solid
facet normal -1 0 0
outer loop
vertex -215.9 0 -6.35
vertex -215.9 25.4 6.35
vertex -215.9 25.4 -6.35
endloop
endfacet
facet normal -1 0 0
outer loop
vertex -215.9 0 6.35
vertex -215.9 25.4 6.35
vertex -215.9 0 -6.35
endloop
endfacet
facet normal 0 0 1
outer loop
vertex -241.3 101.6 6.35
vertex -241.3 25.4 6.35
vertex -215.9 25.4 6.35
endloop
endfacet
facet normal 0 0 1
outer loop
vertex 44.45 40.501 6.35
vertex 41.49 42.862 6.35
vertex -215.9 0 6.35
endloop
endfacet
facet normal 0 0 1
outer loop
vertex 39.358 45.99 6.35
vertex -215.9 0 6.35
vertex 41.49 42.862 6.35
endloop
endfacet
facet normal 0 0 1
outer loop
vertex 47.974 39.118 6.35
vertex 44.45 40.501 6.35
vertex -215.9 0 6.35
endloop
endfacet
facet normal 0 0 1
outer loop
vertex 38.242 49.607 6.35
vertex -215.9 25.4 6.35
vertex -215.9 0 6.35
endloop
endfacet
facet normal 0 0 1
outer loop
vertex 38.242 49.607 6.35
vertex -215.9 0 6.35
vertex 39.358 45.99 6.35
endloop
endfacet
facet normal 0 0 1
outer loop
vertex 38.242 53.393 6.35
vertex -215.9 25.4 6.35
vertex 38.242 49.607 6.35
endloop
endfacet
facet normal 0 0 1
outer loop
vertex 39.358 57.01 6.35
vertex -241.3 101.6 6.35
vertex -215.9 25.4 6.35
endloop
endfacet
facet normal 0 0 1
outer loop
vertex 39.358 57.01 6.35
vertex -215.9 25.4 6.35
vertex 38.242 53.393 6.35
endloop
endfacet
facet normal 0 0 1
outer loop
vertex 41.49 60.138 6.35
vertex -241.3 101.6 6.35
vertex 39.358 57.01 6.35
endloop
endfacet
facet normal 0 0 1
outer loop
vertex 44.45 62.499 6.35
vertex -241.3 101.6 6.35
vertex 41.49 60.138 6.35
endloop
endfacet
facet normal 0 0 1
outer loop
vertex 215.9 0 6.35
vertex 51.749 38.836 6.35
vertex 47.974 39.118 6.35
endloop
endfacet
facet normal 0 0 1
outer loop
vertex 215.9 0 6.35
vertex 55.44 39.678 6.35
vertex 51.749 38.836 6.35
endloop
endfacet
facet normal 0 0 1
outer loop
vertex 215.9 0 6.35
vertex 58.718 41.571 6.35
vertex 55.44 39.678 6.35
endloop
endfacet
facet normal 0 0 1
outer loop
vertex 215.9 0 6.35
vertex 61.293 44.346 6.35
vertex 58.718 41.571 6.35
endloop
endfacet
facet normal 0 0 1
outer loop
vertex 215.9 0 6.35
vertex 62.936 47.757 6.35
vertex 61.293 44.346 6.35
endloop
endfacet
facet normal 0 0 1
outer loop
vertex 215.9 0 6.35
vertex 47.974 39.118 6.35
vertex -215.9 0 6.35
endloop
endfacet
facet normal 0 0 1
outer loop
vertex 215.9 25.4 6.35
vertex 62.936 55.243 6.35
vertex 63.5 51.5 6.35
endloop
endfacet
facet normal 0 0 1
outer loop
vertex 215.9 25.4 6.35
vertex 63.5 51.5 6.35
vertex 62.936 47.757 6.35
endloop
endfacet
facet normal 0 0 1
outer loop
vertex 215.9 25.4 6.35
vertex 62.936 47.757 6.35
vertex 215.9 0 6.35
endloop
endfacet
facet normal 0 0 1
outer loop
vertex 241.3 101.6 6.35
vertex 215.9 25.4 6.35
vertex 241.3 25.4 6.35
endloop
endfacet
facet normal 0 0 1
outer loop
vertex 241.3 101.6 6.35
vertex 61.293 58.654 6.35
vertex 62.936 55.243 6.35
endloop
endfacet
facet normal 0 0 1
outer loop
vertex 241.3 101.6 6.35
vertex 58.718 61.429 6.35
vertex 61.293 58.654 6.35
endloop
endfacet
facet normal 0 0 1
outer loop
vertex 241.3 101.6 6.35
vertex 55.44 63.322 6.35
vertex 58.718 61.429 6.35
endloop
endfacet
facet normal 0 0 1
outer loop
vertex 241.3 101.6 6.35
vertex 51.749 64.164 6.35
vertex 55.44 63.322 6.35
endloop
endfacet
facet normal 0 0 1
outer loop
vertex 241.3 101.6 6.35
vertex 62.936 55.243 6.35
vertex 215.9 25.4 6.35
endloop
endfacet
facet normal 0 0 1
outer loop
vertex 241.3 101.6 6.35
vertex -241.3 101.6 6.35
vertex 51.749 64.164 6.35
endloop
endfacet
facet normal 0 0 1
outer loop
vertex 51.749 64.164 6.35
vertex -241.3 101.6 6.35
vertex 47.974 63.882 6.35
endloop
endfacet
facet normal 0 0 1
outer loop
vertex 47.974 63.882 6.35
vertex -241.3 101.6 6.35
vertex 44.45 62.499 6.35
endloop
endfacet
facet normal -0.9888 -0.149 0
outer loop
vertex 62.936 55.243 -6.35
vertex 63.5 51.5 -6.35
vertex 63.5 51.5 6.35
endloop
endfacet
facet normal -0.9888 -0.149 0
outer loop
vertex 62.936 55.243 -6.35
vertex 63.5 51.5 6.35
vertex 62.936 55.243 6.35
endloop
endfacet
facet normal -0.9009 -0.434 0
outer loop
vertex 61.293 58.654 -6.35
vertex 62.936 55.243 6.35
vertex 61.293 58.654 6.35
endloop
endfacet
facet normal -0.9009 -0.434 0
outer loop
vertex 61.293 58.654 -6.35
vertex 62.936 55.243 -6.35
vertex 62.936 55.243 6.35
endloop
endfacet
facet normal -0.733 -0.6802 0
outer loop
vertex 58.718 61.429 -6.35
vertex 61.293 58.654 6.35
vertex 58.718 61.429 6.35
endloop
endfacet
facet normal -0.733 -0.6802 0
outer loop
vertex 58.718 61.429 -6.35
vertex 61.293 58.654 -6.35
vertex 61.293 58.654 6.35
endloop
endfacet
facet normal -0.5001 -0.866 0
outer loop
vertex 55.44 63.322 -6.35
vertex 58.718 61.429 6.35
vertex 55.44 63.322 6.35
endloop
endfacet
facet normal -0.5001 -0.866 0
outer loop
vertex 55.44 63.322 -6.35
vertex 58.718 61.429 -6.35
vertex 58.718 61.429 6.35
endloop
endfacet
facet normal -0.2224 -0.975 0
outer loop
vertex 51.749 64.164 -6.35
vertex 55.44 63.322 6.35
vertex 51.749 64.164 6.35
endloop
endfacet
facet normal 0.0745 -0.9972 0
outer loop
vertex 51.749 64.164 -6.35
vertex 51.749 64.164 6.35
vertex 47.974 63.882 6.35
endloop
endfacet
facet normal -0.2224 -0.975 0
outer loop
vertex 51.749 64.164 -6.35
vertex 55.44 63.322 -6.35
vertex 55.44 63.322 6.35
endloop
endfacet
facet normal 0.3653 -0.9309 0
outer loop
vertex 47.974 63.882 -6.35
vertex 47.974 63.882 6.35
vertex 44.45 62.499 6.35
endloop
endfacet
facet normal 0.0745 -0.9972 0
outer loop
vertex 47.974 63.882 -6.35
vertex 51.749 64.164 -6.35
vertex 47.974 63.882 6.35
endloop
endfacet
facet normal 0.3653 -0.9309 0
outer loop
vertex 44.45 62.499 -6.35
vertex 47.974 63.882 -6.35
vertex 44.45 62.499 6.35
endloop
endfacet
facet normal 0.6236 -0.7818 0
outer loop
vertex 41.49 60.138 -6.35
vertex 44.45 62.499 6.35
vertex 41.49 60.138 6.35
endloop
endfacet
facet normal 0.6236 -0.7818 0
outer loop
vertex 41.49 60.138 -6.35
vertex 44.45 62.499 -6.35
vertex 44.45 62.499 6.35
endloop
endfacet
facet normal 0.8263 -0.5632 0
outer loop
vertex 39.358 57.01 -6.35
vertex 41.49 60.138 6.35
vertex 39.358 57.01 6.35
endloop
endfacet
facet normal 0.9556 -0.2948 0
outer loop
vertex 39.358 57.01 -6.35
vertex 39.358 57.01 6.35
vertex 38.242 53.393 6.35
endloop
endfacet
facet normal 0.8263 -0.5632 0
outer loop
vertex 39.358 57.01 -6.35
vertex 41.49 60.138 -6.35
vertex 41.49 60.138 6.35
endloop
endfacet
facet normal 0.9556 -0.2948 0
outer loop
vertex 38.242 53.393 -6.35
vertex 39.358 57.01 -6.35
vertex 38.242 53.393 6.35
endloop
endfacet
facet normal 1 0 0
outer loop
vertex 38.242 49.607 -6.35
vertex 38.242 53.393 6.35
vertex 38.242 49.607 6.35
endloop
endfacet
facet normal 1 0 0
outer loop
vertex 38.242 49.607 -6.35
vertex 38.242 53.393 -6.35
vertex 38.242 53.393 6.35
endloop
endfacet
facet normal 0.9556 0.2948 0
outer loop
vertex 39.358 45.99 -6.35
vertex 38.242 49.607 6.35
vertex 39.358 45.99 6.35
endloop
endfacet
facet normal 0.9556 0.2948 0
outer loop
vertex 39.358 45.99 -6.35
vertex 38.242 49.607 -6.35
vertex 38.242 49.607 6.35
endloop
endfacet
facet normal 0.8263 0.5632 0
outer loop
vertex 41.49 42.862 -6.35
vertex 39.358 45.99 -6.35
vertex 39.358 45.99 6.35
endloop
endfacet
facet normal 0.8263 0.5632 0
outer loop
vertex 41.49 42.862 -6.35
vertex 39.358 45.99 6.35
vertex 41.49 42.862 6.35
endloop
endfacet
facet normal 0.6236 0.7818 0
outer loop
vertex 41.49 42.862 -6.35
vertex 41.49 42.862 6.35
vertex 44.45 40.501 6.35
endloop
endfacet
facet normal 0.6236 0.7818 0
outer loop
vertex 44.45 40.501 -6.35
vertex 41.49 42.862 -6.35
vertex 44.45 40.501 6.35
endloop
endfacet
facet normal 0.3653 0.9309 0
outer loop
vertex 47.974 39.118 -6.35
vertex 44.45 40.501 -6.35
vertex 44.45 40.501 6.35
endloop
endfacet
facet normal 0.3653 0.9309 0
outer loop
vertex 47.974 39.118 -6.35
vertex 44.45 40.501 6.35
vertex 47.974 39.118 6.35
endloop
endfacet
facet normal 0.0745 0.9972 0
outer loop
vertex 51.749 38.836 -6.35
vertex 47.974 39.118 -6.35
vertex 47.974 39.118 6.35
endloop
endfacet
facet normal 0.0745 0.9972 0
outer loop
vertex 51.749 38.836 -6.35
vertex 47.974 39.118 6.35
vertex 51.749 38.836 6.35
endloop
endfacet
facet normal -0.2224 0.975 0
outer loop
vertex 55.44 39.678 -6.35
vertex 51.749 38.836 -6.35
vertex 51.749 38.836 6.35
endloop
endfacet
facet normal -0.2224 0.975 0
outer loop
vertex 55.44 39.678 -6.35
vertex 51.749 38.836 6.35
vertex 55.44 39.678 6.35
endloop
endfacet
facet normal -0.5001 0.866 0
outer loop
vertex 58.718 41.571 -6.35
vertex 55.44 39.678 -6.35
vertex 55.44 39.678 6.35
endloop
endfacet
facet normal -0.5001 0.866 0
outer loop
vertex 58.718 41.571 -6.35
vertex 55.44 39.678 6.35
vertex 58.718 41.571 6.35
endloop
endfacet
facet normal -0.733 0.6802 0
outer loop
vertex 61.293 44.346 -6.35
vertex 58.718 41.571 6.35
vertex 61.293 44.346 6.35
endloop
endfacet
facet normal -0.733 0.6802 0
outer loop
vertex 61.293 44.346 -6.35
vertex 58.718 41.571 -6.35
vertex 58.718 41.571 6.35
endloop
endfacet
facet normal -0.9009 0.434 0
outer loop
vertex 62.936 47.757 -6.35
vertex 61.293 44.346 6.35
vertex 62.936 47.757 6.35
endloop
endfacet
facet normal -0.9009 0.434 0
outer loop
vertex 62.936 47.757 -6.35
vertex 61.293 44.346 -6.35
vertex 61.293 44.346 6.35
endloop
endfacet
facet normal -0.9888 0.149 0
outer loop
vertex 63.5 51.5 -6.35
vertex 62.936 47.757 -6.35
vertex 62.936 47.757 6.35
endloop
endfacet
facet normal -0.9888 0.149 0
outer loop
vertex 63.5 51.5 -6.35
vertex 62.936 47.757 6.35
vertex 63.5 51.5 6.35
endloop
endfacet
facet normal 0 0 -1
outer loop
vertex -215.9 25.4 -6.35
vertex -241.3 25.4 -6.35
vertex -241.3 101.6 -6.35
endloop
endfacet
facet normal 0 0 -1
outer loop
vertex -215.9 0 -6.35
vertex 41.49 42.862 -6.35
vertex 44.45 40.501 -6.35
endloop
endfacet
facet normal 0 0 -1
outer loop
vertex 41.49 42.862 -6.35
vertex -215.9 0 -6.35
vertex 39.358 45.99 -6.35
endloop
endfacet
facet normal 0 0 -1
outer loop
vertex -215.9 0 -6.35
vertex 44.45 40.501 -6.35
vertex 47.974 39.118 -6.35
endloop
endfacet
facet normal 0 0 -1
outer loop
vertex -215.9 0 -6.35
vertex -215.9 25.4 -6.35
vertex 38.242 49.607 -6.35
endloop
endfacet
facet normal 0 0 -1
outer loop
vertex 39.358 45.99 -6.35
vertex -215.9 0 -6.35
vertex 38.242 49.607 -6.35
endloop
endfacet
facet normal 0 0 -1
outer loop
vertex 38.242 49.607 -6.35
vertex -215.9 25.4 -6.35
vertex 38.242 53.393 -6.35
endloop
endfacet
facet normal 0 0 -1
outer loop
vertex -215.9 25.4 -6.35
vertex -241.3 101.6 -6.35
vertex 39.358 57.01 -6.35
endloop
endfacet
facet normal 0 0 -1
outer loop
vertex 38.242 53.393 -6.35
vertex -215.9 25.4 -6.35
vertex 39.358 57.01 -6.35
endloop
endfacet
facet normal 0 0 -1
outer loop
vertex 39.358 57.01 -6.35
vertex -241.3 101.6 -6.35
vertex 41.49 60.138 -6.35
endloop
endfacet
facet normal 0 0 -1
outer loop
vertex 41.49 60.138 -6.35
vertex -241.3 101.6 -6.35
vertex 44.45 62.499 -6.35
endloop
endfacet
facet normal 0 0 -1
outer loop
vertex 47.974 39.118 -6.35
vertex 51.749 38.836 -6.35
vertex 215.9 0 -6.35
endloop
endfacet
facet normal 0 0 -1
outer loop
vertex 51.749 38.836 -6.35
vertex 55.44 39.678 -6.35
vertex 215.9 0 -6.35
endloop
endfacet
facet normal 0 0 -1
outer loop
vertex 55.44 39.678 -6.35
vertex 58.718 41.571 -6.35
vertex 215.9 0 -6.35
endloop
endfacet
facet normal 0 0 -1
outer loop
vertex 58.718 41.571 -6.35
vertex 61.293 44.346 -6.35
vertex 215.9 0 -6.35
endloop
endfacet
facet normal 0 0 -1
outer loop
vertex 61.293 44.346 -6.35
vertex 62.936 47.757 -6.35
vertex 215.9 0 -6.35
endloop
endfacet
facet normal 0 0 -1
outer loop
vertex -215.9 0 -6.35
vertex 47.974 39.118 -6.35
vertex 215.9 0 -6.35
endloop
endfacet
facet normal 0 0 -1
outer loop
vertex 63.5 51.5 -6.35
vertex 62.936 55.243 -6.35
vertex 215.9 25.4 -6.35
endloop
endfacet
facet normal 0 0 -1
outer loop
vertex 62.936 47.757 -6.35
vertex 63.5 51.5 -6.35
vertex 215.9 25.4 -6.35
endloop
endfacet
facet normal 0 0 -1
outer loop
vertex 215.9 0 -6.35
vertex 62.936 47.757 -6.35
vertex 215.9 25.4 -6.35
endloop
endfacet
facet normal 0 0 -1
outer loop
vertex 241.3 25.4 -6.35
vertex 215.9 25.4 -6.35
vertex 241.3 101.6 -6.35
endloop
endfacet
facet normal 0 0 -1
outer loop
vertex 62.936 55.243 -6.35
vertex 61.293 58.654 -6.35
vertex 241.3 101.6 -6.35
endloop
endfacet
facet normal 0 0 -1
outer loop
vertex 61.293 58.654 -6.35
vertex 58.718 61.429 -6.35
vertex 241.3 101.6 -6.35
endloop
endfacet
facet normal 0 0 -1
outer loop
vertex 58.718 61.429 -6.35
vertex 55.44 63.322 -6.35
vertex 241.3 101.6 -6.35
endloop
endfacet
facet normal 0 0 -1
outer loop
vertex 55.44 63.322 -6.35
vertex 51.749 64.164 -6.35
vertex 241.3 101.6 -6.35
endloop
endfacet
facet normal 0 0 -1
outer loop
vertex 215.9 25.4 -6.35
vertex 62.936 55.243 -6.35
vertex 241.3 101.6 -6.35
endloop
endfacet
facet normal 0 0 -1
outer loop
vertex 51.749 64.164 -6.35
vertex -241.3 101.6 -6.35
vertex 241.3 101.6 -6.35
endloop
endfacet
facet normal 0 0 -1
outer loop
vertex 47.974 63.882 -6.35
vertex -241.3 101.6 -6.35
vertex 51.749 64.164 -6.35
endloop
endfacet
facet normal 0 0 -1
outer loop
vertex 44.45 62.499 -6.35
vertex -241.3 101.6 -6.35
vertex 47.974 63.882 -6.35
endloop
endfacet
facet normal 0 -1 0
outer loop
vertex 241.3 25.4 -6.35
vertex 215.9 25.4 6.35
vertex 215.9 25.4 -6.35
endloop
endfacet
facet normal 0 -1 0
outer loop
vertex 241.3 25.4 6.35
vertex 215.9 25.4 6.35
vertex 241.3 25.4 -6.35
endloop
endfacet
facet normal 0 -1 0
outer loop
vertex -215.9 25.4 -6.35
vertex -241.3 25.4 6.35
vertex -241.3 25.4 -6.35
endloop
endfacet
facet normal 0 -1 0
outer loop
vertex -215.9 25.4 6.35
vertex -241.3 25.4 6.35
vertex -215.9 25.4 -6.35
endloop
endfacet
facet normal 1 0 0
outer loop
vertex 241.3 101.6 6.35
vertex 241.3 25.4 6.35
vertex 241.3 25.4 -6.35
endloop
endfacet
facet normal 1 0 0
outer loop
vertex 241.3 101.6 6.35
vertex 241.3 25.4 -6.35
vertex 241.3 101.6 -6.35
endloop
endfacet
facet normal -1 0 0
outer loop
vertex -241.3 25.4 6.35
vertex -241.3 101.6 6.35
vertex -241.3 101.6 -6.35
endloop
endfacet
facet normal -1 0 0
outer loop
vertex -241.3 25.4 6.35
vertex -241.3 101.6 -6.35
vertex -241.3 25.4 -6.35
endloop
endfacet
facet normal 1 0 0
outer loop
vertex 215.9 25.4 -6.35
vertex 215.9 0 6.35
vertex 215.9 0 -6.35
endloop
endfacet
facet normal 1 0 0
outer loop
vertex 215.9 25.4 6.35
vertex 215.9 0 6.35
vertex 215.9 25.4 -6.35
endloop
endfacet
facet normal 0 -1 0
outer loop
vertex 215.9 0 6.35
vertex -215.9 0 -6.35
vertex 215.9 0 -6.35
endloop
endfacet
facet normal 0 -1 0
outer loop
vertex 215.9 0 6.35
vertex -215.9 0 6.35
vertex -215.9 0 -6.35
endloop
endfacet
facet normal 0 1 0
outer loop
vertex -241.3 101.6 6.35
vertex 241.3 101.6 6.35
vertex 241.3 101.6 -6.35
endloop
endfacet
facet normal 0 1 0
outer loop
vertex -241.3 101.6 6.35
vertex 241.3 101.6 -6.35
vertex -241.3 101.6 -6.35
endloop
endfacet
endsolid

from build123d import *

# Parameters (mm, degrees)
BOSS_EXTRUDE1_DEPTH = 6.35
CAVITY1_START       = -6.35
CAVITY1_OUTLINE_R   = 12.7
CAVITY1_DEPTH       = 12.7


# Read off the part's stored shape, not the designer's step: Cavity1
with BuildPart() as part:
    # Sketch1 → Boss-Extrude1 (new, symmetric)
    with BuildSketch(Plane.XY):
        Polygon((-215.9, 0), (215.9, 0), (215.9, 25.4), (241.3, 25.4), (241.3, 101.6), (-241.3, 101.6), (-241.3, 25.4), (-215.9, 25.4), align=None)
    extrude(amount=BOSS_EXTRUDE1_DEPTH, both=True)

    # Cavity1 outline → Cavity1 (cut)
    with BuildSketch(Plane.XY.offset(CAVITY1_START)):
        with Locations((50.8, 51.5)):
            Circle(CAVITY1_OUTLINE_R)
    extrude(amount=CAVITY1_DEPTH, mode=Mode.SUBTRACT)


solid = part.part
